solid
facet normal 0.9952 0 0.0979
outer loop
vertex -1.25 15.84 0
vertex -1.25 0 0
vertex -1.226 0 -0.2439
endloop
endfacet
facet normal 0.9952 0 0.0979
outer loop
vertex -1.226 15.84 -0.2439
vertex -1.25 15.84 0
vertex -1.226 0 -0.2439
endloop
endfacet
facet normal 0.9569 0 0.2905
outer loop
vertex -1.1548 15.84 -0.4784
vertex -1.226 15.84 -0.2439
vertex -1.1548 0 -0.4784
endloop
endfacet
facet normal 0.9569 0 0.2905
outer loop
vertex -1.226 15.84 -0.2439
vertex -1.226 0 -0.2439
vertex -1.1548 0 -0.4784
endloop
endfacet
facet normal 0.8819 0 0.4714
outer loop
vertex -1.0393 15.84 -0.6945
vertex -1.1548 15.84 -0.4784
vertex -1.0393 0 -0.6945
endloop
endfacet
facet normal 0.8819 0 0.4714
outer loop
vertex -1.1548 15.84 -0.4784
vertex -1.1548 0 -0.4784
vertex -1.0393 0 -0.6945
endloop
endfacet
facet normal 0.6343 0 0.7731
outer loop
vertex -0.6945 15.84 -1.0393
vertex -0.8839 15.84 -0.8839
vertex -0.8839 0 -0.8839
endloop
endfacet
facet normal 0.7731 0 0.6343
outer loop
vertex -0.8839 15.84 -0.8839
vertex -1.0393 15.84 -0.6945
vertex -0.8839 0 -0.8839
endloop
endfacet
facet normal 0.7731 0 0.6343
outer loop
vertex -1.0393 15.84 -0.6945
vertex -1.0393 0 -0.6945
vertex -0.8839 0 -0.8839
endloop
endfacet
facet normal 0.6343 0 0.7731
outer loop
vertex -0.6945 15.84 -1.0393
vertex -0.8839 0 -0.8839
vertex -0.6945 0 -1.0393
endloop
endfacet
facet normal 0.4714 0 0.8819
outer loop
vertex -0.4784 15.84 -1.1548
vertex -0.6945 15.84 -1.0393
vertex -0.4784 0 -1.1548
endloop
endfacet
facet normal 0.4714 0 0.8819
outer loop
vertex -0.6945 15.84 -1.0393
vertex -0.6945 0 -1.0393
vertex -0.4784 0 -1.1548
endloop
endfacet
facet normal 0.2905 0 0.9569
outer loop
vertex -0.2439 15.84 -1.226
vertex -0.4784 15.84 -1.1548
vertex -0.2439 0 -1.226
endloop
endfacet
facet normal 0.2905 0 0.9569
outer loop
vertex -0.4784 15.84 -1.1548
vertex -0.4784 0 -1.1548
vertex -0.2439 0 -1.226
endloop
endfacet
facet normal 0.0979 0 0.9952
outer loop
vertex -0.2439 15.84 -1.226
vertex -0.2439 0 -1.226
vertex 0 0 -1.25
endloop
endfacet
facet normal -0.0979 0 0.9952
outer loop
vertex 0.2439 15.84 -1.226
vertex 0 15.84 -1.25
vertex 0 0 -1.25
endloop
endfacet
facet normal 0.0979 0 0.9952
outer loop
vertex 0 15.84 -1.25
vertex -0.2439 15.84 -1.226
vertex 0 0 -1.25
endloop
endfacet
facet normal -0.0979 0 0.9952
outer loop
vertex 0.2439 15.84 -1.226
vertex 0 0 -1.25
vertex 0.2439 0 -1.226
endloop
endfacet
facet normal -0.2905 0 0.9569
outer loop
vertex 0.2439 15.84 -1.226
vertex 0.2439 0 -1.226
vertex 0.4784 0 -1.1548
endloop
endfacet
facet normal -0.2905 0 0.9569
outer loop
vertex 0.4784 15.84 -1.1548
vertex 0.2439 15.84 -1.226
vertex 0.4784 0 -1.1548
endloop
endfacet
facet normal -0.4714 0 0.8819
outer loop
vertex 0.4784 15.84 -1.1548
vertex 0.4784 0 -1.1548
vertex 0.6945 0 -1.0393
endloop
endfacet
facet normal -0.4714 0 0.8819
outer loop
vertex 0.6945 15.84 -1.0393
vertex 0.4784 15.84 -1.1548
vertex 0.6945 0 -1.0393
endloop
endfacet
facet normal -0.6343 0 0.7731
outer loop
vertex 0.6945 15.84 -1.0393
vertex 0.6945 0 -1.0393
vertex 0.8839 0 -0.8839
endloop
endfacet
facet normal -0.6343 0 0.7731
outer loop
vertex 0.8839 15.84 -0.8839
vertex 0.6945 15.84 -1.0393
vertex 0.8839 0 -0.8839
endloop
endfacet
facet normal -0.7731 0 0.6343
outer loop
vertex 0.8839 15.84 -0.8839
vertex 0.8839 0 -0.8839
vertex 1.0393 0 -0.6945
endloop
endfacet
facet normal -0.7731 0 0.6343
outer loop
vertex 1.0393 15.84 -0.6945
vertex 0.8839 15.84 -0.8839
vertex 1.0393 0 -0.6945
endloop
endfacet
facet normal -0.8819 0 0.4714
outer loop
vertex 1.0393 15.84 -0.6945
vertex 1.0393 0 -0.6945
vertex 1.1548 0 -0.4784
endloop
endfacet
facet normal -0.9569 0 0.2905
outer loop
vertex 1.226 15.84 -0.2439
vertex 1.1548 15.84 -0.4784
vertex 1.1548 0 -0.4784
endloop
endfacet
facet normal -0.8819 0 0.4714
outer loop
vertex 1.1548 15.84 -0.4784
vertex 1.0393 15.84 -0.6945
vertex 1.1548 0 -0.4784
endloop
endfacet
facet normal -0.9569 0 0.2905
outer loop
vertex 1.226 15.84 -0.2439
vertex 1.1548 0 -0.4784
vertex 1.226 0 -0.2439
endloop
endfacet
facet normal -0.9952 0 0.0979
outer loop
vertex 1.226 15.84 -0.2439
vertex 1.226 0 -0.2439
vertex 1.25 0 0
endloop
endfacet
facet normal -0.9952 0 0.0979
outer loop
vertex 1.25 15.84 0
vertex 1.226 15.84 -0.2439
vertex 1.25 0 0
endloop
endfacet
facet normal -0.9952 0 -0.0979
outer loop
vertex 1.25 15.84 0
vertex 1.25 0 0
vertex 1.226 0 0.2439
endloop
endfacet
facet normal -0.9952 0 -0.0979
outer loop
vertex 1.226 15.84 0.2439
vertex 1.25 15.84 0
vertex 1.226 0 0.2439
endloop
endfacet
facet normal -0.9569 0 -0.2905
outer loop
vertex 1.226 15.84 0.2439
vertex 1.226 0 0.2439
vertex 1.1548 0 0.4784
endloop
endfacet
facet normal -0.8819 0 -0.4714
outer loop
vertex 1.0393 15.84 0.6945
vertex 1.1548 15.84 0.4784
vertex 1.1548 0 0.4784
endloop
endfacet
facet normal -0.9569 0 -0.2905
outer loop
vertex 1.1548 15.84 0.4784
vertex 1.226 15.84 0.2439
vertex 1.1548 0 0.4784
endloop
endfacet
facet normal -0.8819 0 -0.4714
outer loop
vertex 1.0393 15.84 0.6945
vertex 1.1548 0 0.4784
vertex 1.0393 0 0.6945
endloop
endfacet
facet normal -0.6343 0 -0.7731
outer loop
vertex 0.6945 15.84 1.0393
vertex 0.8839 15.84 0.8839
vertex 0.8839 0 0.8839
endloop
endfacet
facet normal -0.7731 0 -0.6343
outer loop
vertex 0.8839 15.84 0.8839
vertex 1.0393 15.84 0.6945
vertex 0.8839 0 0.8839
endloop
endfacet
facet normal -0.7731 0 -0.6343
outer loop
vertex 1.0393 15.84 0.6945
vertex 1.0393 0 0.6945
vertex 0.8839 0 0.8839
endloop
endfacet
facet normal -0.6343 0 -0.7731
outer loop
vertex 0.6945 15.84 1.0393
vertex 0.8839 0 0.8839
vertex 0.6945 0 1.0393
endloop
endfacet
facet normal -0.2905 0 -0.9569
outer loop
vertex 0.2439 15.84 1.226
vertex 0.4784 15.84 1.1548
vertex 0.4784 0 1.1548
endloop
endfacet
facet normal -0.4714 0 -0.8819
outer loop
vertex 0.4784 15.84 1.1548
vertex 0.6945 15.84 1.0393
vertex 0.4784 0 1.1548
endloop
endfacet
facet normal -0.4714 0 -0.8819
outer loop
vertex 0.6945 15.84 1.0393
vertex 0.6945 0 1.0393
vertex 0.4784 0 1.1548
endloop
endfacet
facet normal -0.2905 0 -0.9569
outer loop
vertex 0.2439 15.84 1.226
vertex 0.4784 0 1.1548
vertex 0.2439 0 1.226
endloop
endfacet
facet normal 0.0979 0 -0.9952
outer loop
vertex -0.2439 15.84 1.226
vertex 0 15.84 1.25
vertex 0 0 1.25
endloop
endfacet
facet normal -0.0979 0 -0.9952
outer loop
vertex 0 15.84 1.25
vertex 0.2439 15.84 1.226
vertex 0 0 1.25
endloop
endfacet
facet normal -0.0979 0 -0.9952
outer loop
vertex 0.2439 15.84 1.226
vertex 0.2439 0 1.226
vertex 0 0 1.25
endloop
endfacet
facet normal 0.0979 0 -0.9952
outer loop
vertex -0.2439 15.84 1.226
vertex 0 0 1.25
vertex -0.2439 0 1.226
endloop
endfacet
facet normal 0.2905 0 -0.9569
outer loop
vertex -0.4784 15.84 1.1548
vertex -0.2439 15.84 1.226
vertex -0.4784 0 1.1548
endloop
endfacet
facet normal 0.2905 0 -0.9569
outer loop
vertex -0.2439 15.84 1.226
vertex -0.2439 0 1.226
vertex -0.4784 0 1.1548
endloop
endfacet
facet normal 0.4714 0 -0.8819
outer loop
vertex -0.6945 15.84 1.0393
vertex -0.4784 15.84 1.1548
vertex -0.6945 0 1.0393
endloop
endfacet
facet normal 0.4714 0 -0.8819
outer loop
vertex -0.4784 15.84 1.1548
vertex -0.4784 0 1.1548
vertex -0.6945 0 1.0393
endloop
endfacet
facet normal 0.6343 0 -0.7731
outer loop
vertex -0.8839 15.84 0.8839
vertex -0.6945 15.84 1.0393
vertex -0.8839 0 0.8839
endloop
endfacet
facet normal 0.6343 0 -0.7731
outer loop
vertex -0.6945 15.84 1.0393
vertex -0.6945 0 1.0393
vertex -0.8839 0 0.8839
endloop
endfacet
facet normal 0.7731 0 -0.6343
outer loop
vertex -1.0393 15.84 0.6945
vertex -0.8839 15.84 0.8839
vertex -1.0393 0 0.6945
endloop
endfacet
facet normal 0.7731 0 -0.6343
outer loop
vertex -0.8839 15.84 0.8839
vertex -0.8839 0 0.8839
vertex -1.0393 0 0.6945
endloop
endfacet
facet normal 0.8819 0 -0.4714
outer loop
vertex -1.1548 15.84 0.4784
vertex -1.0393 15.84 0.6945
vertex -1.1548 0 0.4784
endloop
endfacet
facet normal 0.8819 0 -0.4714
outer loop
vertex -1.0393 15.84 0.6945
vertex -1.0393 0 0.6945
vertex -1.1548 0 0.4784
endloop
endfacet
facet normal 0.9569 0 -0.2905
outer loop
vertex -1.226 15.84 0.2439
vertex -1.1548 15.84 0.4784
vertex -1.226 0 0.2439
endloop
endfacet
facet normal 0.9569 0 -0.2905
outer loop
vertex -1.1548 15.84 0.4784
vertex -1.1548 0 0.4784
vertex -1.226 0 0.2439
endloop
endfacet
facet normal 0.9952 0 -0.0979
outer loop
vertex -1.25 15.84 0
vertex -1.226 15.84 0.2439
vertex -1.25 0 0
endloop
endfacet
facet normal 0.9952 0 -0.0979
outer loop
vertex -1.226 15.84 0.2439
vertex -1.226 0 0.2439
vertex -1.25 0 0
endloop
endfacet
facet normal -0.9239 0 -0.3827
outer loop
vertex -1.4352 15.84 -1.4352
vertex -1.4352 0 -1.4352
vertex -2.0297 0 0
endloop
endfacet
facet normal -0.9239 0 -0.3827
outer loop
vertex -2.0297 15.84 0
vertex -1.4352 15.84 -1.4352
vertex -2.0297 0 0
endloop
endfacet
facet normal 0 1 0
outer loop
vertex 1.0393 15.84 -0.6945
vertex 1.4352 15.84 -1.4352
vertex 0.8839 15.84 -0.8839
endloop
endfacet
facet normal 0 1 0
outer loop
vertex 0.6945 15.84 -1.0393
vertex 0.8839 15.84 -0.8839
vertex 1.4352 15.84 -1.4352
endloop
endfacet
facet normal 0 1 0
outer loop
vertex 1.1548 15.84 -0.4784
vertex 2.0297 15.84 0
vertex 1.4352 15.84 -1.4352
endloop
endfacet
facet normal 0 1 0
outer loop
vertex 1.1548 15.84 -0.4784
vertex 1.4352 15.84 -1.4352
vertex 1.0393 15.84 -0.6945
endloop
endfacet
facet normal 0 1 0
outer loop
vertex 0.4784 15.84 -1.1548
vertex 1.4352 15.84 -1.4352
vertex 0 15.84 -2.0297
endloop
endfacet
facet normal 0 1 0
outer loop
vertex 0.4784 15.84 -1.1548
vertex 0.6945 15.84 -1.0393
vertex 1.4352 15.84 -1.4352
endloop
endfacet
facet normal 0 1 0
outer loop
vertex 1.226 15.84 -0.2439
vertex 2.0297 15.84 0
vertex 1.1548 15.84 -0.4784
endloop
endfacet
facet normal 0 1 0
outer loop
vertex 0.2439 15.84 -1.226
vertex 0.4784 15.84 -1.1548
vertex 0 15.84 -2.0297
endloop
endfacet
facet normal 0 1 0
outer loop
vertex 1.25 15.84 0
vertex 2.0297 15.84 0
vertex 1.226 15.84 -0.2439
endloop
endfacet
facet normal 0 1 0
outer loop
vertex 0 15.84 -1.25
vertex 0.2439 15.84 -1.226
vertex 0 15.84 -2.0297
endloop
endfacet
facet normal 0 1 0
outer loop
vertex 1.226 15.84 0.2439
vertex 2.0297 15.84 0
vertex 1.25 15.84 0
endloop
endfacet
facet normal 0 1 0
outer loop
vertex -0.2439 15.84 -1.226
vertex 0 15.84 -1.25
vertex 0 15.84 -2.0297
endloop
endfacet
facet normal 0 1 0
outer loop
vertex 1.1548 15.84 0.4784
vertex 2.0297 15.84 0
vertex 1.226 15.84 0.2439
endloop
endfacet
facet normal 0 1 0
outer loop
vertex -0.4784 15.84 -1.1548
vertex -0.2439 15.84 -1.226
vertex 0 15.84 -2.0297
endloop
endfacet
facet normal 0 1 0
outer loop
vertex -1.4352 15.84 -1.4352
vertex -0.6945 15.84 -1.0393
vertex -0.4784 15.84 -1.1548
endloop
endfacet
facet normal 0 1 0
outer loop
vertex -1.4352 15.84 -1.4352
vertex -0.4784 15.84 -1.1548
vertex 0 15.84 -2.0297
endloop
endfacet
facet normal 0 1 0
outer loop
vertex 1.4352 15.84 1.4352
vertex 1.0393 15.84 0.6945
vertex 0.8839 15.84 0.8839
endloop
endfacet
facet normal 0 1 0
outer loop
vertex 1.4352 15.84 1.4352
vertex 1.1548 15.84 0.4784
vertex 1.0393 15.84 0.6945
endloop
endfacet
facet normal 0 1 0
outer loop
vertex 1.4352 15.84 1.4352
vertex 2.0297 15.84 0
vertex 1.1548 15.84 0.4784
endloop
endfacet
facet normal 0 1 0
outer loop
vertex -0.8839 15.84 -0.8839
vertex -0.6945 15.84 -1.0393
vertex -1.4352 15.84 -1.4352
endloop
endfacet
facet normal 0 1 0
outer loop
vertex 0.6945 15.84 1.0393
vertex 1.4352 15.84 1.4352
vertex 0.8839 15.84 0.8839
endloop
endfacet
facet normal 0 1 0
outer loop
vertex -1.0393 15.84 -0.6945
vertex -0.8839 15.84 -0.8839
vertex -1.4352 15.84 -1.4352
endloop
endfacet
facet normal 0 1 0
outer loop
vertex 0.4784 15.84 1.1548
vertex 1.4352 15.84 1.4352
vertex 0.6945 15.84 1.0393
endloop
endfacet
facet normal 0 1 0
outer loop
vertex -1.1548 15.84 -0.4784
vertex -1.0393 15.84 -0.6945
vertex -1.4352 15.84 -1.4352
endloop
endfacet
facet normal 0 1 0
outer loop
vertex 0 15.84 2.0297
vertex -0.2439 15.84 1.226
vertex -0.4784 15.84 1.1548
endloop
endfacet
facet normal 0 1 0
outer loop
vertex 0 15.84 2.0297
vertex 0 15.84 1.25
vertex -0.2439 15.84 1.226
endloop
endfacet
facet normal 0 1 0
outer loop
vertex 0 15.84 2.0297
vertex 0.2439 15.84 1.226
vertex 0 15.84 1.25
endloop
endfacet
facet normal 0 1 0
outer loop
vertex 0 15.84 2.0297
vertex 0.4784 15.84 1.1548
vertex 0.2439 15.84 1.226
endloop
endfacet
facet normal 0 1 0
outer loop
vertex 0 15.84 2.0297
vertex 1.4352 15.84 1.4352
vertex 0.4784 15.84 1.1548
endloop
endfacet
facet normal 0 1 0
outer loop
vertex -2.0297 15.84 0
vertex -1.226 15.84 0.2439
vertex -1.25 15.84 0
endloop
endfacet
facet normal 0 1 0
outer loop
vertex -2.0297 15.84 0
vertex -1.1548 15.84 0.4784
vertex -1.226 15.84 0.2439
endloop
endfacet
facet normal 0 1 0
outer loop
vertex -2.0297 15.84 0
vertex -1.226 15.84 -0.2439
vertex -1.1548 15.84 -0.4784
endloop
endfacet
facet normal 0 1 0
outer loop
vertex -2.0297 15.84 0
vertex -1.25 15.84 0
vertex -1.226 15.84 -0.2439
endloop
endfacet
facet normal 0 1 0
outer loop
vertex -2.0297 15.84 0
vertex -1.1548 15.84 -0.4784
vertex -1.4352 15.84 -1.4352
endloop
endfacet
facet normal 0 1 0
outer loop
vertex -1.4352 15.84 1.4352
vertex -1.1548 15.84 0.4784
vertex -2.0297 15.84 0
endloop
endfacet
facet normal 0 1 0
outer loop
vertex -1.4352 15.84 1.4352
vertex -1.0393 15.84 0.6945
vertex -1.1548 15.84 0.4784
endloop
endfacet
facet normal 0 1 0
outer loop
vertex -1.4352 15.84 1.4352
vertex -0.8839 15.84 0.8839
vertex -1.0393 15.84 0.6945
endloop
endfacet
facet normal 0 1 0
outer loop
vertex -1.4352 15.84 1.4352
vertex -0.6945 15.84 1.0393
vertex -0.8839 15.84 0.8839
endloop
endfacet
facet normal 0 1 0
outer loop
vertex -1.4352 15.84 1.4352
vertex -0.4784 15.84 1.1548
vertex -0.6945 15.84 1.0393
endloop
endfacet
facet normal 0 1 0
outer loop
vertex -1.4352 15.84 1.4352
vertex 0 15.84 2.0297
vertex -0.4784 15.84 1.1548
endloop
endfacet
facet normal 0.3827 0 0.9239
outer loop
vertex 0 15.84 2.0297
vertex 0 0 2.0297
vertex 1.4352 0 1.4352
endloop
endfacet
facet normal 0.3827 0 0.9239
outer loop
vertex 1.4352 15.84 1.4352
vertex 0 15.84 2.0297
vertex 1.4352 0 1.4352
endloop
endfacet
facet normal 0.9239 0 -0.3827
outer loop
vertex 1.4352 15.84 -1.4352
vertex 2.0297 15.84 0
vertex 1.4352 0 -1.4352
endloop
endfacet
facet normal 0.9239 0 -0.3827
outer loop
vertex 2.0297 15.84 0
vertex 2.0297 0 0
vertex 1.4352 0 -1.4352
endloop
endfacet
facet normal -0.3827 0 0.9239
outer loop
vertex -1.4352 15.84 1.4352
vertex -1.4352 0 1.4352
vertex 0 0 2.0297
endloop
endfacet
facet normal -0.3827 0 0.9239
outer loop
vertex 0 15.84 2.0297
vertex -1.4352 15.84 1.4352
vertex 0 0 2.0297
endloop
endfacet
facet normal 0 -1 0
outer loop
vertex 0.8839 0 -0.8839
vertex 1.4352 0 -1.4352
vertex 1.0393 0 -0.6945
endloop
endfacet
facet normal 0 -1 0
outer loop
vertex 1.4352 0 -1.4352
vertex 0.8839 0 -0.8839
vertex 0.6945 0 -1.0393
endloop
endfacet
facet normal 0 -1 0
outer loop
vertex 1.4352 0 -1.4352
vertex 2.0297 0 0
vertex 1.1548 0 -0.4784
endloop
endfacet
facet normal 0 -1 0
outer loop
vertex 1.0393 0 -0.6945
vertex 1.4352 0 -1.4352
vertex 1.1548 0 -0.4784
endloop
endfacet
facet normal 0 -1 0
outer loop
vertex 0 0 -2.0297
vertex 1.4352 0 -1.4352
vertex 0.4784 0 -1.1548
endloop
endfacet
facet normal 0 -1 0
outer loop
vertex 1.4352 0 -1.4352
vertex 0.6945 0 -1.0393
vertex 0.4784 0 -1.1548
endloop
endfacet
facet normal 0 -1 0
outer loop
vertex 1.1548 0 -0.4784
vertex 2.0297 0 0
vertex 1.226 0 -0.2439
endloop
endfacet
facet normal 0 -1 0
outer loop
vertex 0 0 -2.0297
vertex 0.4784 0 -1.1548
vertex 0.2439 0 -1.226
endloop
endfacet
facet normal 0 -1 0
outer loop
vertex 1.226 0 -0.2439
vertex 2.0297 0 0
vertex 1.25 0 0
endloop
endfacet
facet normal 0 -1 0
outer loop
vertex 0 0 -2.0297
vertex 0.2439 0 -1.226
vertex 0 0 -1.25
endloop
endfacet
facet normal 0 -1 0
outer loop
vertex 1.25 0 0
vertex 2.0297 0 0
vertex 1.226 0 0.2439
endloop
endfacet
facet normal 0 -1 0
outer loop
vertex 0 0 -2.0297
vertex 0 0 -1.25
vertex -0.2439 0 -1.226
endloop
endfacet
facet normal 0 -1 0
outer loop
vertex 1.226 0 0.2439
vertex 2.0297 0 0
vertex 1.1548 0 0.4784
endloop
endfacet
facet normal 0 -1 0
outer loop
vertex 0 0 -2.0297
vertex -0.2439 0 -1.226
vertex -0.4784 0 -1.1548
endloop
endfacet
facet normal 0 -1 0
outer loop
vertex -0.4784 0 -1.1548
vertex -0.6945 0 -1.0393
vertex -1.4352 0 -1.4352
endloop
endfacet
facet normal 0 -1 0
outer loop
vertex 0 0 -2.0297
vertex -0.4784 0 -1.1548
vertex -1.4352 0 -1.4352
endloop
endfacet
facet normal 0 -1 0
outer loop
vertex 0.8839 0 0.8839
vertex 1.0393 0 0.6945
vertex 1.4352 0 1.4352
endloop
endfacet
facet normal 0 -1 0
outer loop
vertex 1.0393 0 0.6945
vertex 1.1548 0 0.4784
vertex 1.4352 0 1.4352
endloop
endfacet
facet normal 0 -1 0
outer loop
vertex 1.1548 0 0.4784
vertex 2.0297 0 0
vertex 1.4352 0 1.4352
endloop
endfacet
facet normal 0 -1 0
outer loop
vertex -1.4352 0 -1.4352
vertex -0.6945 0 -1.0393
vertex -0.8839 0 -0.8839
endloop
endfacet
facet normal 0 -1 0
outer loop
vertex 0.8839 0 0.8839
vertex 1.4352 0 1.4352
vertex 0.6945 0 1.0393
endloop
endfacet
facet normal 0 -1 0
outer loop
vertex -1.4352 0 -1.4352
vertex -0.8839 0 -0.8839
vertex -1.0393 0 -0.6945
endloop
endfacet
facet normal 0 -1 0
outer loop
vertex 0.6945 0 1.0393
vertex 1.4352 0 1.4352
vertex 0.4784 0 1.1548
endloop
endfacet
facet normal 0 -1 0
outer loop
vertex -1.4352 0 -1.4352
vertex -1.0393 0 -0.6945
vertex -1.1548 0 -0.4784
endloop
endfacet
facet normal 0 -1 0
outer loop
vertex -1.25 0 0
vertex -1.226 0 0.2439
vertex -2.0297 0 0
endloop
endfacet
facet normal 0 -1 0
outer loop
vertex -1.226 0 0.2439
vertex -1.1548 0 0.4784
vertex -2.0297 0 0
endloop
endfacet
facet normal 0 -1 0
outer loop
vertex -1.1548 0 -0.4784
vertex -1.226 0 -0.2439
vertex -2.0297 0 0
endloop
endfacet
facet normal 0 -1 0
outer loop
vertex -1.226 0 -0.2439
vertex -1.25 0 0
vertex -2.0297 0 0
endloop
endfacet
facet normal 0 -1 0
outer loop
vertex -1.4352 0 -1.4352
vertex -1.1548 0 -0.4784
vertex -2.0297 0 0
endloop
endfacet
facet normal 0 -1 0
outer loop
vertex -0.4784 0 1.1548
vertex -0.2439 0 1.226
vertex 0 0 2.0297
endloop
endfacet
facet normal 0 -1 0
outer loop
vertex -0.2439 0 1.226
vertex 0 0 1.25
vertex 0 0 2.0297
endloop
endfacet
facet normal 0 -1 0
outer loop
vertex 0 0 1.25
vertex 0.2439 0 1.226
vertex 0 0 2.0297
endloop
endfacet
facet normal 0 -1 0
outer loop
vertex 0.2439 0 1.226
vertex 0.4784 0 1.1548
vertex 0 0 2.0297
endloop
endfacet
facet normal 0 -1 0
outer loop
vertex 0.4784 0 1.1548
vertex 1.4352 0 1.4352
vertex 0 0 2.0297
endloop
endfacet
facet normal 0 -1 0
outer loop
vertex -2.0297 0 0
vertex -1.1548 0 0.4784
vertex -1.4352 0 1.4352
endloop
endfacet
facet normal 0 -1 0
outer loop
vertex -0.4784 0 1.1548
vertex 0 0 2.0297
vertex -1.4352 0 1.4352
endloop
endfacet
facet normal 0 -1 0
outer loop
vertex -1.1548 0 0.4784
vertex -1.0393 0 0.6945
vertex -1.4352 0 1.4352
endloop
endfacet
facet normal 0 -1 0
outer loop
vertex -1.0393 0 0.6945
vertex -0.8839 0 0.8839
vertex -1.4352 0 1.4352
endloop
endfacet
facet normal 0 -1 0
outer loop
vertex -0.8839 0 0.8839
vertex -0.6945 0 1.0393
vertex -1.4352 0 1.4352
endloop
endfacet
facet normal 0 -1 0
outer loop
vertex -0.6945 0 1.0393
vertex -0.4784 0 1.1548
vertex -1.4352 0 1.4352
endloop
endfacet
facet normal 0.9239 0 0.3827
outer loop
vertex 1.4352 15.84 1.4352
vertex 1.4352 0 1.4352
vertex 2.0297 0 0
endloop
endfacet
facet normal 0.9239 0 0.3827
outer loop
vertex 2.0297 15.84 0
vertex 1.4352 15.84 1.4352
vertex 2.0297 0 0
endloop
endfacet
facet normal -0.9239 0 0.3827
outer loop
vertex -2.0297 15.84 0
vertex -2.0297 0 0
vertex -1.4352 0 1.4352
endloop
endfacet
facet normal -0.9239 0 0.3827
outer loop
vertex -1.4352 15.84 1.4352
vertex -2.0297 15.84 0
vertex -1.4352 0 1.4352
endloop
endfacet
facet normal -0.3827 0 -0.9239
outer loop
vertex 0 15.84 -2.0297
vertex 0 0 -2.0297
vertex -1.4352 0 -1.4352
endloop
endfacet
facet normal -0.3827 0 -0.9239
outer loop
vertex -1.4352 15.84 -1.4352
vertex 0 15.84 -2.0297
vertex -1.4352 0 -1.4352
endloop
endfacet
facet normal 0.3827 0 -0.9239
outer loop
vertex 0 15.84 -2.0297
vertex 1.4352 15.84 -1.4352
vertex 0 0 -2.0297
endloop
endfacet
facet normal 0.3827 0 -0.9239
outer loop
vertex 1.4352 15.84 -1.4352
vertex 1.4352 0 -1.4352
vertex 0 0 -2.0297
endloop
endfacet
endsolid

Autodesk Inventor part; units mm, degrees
ref_plane "YZ Plane" through (0, 0, 0) normal (1, 0, 0) x (0, 1, 0)
ref_plane "XZ Plane" through (0, 0, 0) normal (0, 1, 0) x (-1, 0, 0)
ref_plane "XY Plane" through (0, 0, 0) normal (0, 0, 1) x (1, 0, 0)
sketch "Sketch1" plane through (0, 0, 0) normal (0, 1, 0) x (-1, 0, 0)
  circle A0 centre (0, 0) radius 1.25
  line L0 (0, 0) -> (2.5, 0) construction
  line L1 (1.4352, -1.4352) -> (2.0297, 0)
  line L2 (1.4352, 1.4352) -> (0, 2.0297)
  line L3 (0, 2.0297) -> (-1.4352, 1.4352)
  line L4 (-1.4352, 1.4352) -> (-2.0297, 0)
  line L5 (-2.0297, 0) -> (-1.4352, -1.4352)
  line L6 (-1.4352, -1.4352) -> (0, -2.0297)
  line L7 (0, -2.0297) -> (1.4352, -1.4352)
  line L8 (2.0297, 0) -> (1.4352, 1.4352)
  dimension "d0" = 2.5
extrude "Extrusion1" add sketch "Sketch1" along normal blind 15.84
properties part number "base_telaio_casters"
